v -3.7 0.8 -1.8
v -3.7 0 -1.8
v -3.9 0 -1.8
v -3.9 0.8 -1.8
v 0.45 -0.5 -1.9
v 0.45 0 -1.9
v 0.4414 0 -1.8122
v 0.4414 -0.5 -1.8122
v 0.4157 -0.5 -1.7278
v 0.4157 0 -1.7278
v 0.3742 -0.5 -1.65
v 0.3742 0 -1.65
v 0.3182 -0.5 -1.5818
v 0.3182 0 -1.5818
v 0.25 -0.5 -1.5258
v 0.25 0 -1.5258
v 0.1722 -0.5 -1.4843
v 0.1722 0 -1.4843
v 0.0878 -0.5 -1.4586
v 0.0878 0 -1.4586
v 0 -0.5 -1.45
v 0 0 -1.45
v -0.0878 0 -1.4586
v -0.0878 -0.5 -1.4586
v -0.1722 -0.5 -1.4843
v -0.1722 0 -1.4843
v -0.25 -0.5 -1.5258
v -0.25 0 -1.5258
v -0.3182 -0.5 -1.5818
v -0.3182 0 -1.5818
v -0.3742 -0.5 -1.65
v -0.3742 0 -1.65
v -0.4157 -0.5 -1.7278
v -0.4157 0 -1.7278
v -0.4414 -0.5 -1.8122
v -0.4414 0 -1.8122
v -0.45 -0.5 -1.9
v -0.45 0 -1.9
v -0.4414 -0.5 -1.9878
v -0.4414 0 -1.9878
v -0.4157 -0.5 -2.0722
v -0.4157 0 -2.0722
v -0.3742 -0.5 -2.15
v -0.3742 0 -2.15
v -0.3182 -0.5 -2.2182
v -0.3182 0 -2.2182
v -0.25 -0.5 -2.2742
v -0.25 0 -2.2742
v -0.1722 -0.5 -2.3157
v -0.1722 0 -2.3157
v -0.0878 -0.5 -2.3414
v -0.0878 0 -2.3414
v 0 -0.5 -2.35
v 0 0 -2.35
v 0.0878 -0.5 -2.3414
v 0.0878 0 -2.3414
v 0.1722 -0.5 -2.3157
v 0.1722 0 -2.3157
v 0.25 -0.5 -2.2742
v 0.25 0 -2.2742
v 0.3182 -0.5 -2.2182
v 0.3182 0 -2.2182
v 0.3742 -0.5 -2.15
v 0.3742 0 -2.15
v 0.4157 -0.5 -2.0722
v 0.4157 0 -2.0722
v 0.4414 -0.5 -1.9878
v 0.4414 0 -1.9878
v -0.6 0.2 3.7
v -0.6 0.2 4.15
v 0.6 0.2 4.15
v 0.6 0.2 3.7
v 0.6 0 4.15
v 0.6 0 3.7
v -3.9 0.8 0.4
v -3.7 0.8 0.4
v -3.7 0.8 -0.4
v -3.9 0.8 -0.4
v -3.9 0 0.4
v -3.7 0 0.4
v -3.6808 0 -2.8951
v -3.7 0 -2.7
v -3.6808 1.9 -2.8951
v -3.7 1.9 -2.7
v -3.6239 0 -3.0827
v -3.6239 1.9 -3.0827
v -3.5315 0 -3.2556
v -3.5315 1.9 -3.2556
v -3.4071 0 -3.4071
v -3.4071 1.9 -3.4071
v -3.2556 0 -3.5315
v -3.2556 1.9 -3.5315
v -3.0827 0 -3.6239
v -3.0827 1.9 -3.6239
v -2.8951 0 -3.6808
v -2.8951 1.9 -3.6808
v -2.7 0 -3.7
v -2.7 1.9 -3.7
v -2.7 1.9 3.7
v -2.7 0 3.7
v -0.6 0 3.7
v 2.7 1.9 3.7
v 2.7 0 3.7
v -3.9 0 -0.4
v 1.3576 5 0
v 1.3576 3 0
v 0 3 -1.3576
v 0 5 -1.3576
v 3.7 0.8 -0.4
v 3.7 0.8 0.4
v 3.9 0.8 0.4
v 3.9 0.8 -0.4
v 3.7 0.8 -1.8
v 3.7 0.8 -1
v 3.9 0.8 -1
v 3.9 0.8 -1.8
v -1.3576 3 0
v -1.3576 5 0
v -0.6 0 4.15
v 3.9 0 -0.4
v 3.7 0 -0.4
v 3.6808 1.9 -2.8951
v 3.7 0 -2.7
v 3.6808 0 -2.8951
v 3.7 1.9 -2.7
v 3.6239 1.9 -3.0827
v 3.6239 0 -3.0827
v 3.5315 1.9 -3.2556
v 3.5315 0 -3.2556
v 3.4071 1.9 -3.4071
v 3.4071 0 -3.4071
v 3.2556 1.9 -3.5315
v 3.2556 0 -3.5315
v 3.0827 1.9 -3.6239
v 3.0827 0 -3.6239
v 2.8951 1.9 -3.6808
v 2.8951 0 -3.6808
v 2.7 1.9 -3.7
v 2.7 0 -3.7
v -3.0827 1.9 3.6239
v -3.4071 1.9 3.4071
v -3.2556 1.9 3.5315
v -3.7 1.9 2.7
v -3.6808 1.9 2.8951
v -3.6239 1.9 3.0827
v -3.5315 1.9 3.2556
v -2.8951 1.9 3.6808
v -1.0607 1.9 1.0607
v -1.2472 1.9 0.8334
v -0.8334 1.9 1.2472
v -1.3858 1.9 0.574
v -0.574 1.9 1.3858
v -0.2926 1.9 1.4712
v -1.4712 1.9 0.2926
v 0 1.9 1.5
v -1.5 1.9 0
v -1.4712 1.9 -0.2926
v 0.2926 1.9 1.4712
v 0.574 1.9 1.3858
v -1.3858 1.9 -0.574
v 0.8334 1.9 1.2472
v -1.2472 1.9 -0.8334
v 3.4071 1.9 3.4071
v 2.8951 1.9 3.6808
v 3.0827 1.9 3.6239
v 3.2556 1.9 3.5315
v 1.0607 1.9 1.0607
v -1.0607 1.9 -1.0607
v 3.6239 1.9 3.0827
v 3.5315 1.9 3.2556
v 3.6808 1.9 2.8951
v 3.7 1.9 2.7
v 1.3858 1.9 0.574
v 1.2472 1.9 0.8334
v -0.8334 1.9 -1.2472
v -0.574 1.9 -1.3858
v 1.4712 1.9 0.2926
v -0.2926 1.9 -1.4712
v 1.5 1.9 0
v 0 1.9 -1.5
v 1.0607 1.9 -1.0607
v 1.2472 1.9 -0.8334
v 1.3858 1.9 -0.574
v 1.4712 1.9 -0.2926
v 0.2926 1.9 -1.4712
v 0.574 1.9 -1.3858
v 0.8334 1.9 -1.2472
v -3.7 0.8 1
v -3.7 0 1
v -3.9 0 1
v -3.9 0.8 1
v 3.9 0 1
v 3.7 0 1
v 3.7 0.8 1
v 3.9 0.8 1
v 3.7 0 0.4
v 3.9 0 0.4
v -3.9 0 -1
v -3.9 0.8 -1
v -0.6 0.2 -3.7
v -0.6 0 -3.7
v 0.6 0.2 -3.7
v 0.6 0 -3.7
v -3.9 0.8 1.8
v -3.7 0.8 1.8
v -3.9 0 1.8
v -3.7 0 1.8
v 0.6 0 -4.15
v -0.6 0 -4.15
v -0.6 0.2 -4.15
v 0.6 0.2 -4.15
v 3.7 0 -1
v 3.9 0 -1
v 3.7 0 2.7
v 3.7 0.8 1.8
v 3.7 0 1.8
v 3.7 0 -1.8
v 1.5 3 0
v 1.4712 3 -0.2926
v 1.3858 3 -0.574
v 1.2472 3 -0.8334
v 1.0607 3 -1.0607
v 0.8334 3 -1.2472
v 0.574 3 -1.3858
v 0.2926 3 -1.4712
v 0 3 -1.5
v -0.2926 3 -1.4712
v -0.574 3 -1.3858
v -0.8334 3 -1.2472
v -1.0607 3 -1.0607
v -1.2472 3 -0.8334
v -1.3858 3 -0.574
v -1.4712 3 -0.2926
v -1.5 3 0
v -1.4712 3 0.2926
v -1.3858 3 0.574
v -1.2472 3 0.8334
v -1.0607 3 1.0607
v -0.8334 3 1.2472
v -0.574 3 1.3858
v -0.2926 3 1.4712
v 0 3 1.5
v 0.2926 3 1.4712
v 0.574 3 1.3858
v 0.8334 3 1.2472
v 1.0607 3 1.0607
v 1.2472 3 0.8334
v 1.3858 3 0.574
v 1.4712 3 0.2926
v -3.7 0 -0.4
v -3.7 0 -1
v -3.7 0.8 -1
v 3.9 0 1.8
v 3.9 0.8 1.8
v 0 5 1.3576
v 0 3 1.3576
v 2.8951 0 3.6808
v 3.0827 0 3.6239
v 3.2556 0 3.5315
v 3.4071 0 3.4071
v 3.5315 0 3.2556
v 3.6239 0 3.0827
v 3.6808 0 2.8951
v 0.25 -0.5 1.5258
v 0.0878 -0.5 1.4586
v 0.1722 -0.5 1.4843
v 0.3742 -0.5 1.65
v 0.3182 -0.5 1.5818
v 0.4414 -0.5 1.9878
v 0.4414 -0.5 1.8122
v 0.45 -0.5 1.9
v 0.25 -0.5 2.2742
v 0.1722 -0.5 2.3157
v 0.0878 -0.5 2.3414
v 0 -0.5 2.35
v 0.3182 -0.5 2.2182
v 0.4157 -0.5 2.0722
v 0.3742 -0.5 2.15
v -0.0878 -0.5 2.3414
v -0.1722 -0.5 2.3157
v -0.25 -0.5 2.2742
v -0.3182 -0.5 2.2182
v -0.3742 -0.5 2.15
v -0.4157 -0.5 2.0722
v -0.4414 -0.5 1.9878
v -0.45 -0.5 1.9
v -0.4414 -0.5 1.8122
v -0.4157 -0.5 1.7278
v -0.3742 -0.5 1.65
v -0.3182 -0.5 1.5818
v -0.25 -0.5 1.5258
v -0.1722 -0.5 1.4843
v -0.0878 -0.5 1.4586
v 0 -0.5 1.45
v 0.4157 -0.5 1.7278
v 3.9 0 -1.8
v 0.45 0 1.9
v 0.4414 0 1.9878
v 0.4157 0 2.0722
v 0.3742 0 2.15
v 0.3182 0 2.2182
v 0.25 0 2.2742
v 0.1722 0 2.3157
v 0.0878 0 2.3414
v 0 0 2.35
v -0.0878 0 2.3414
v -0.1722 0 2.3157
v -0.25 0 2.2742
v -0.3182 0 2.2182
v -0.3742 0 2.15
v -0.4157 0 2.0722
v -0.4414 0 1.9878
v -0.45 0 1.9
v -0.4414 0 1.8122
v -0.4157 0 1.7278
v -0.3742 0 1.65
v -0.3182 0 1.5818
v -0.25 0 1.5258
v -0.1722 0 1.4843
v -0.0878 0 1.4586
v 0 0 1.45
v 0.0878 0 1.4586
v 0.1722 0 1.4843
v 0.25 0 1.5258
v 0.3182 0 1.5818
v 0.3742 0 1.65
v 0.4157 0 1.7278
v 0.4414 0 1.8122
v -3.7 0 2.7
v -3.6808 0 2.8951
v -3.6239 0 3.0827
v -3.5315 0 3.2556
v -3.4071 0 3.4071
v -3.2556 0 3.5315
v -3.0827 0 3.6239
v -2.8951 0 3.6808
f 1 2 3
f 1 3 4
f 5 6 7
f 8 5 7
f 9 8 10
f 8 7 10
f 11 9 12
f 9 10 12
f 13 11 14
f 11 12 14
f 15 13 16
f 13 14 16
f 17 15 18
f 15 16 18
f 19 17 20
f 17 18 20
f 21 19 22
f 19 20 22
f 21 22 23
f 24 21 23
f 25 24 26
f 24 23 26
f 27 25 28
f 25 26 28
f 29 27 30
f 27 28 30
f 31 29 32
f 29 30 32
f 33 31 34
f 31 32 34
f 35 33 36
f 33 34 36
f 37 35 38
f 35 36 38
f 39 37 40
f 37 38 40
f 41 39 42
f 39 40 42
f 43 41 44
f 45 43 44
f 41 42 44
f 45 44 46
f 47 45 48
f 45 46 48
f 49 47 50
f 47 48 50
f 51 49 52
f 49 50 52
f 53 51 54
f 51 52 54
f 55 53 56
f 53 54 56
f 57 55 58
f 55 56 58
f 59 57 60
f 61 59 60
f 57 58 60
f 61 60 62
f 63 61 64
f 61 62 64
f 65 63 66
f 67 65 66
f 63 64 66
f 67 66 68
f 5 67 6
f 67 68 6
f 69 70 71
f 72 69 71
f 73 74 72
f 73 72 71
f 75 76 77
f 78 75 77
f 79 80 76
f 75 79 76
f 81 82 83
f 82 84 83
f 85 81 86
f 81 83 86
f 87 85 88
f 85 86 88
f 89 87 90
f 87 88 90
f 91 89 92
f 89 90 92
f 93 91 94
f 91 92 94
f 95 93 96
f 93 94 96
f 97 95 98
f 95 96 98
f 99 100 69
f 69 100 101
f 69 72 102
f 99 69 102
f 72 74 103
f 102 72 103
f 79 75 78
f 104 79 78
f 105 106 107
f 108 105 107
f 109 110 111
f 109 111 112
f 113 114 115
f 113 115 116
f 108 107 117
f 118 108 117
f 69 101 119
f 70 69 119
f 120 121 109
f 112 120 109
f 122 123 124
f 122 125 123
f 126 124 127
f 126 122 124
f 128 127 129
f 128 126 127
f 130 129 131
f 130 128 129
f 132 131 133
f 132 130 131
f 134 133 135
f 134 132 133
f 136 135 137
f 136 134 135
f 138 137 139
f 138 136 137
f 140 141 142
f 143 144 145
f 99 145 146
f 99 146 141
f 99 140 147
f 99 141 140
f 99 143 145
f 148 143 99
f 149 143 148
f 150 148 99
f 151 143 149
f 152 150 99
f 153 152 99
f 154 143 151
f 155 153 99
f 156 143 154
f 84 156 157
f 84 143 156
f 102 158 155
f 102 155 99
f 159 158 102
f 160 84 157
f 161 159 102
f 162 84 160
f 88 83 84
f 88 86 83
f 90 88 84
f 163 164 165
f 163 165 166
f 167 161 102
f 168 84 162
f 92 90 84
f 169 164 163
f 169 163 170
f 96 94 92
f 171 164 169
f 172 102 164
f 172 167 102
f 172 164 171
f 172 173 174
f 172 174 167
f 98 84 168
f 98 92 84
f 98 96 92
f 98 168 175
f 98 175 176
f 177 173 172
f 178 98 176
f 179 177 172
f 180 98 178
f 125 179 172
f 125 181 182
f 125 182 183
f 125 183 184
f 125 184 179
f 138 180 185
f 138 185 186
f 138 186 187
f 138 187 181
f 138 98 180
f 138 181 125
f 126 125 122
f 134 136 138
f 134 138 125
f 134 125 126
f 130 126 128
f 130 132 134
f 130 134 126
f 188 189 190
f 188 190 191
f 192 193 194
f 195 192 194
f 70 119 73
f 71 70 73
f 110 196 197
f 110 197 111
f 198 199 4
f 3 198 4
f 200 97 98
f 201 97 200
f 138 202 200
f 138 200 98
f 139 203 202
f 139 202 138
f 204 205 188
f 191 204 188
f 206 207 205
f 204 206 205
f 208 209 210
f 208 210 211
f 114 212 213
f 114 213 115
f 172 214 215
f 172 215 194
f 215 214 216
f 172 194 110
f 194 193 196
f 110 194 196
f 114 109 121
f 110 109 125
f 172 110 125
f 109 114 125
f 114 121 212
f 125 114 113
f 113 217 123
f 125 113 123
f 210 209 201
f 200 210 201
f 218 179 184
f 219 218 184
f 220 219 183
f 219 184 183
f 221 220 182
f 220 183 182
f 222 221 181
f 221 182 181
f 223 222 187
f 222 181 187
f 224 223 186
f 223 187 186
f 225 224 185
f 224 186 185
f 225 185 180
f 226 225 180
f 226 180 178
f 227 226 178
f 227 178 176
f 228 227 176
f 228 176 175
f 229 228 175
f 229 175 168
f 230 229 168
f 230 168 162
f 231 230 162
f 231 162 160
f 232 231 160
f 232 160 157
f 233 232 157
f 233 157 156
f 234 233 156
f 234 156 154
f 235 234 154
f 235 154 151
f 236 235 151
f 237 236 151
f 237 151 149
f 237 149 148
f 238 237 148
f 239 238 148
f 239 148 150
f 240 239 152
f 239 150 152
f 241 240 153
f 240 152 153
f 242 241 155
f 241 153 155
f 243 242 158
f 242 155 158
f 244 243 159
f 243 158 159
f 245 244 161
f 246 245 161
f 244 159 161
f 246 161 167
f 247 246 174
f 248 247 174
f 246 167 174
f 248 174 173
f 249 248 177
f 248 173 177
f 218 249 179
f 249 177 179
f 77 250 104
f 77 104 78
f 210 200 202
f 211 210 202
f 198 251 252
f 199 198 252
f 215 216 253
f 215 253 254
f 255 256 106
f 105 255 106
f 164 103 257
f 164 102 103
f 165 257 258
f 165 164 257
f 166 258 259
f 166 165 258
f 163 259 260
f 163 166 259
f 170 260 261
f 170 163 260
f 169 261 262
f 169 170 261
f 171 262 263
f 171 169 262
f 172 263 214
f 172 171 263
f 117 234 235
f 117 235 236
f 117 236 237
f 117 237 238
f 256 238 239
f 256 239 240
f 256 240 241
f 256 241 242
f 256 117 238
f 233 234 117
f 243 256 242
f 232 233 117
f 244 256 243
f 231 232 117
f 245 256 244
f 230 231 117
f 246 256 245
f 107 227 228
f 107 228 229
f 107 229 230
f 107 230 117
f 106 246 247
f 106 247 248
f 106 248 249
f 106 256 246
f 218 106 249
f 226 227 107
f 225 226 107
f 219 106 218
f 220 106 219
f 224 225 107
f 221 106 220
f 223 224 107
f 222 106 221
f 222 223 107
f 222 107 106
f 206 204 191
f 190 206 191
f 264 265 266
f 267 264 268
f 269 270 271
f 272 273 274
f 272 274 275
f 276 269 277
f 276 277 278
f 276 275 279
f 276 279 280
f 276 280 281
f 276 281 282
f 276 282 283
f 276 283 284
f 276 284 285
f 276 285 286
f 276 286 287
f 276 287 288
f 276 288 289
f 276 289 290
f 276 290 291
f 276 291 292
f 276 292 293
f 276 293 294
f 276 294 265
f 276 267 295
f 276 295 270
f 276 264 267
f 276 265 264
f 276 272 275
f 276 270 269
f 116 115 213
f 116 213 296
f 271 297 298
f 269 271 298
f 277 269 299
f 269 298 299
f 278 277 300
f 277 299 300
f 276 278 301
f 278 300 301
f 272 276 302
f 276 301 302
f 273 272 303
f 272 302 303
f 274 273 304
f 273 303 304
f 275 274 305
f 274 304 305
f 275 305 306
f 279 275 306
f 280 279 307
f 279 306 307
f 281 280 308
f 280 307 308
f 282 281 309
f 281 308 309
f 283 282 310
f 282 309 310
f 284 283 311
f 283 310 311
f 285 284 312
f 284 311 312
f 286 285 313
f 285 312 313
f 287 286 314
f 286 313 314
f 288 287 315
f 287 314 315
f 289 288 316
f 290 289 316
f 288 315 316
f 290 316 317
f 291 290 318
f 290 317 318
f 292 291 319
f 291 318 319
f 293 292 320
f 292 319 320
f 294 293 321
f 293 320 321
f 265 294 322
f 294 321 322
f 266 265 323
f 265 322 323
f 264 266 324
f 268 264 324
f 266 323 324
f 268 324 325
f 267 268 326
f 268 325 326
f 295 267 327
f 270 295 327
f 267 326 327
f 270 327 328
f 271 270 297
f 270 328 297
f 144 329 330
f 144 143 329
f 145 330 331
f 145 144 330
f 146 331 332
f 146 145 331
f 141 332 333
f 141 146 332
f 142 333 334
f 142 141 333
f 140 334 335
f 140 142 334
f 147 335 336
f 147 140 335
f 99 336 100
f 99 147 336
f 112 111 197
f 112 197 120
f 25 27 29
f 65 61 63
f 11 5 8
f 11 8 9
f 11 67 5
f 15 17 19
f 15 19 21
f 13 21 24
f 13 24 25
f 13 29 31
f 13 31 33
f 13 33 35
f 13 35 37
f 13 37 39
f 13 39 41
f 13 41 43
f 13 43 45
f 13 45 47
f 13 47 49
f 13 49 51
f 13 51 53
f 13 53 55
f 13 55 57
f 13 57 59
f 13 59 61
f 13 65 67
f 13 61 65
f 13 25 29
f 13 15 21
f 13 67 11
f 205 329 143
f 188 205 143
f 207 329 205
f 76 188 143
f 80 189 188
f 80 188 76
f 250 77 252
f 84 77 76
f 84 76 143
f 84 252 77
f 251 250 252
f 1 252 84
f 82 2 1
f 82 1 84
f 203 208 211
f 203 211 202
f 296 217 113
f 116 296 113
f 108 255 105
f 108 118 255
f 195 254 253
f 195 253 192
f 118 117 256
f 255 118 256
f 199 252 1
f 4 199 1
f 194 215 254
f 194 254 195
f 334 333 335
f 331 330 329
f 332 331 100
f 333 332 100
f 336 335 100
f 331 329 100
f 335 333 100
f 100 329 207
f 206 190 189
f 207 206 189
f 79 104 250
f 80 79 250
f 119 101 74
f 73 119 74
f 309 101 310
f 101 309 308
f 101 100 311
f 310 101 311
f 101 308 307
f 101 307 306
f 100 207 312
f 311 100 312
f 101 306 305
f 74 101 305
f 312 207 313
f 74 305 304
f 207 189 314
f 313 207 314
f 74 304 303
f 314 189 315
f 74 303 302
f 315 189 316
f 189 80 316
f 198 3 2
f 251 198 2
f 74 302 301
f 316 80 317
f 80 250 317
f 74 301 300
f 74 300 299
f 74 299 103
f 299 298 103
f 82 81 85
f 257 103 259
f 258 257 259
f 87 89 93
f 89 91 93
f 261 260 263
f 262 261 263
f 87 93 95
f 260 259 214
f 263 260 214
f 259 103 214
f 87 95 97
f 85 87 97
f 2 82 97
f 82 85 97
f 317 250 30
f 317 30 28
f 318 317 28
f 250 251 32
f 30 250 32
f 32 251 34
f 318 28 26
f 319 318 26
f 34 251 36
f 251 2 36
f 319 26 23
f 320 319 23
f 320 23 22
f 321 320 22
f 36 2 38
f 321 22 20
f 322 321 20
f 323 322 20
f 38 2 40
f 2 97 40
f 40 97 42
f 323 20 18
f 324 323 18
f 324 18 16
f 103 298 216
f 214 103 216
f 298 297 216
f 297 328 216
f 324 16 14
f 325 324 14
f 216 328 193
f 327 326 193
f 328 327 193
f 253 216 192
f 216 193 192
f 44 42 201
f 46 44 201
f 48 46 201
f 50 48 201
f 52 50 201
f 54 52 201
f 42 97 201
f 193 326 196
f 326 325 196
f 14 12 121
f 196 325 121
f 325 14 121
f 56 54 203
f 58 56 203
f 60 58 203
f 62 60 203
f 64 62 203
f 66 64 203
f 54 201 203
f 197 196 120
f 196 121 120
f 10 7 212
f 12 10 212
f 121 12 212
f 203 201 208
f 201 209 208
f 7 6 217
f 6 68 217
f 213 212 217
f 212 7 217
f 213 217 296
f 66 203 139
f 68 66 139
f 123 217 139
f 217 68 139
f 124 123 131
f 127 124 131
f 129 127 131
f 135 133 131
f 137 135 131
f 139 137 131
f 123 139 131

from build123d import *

# Parameters (mm, degrees)
SZKIC2_W                    = 7.4
SZKIC2_H                    = 7.4
DODANIE_WYCI_GNI_CIE1_DEPTH = 1.9
DODANIE_WYCI_GNI_CIE2_START = -1.9
DODANIE_WYCI_GNI_CIE2_DEPTH = 5
DODANIE_WYCI_GNI_CIE3_START = -1.9
SZKIC4_R                    = 1.5
DODANIE_WYCI_GNI_CIE3_DEPTH = 3
SZKIC5_R                    = 0.45
DODANIE_WYCI_GNI_CIE4_DEPTH = 0.5
SZKIC6_W                    = 0.8
SZKIC6_H                    = 0.8
DODANIE_WYCI_GNI_CIE5_DEPTH = 0.2
ZAOKR_GLENIE1_R             = 1
SZKIC7_W                    = 1.2
SZKIC7_H                    = 0.9
DODANIE_WYCI_GNI_CIE6_DEPTH = 0.2


with BuildPart() as part:
    # Szkic2 → Dodanie-wyciągnięcie1 (new body)
    with BuildSketch(Plane(origin=(0, 0, 0), x_dir=(1, 0, 0), z_dir=(0, 1, 0))):
        Rectangle(SZKIC2_W, SZKIC2_H)
    extrude(amount=DODANIE_WYCI_GNI_CIE1_DEPTH)

    # Szkic3 → Dodanie-wyciągnięcie2 (add)
    with BuildSketch(Plane(origin=(0, 1.9, 0), x_dir=(1, 0, 0), z_dir=(0, 1, 0)).offset(DODANIE_WYCI_GNI_CIE2_START)):
        Polygon((0, -1.35764502), (1.35764502, 0), (0, 1.35764502), (-1.35764502, 0), align=None)
    extrude(amount=DODANIE_WYCI_GNI_CIE2_DEPTH)

    # Szkic4 → Dodanie-wyciągnięcie3 (add)
    with BuildSketch(Plane(origin=(0, 1.9, 0), x_dir=(1, 0, 0), z_dir=(0, 1, 0)).offset(DODANIE_WYCI_GNI_CIE3_START)):
        Circle(SZKIC4_R)
    extrude(amount=DODANIE_WYCI_GNI_CIE3_DEPTH)

    # Szkic5 → Dodanie-wyciągnięcie4 (add)
    with BuildSketch(Plane.XZ):
        with Locations((0, 1.9)):
            Circle(SZKIC5_R)
        with Locations((0, -1.9)):
            Circle(SZKIC5_R)
    extrude(amount=DODANIE_WYCI_GNI_CIE4_DEPTH)

    # Szkic6 → Dodanie-wyciągnięcie5 (add)
    with BuildSketch(Plane(origin=(3.7, 0, 0), x_dir=(0, 0, -1), z_dir=(1, 0, 0))):
        with Locations((-1.4, 0.4)):
            Rectangle(SZKIC6_W, SZKIC6_H)
        with Locations((0, 0.4)):
            Rectangle(SZKIC6_W, SZKIC6_H)
        with Locations((1.4, 0.4)):
            Rectangle(SZKIC6_W, SZKIC6_H)
    dodanie_wyci_gni_cie5 = extrude(amount=DODANIE_WYCI_GNI_CIE5_DEPTH)

    # Lustro1: Dodanie-wyciągnięcie5 across plane
    add(dodanie_wyci_gni_cie5.mirror(Plane(origin=(0, 0, 0), x_dir=(0, 0, 1), z_dir=(1, 0, 0))))

    # Zaokrąglenie1
    zaokr_glenie1_edges = [part.edges().sort_by_distance(p)[0] for p in [
        (3.7, 0.95, 3.7),
        (-3.7, 0.95, 3.7),
        (-3.7, 0.95, -3.7),
        (3.7, 0.95, -3.7),
    ]]
    fillet(zaokr_glenie1_edges, radius=ZAOKR_GLENIE1_R)

    # Szkic7 → Dodanie-wyciągnięcie6 (add)
    with BuildSketch(Plane.XZ):
        with Locations((0, 3.7)):
            Rectangle(SZKIC7_W, SZKIC7_H)
        with Locations((0, -3.7)):
            Rectangle(SZKIC7_W, SZKIC7_H)
    extrude(amount=-DODANIE_WYCI_GNI_CIE6_DEPTH)


solid = part.part
